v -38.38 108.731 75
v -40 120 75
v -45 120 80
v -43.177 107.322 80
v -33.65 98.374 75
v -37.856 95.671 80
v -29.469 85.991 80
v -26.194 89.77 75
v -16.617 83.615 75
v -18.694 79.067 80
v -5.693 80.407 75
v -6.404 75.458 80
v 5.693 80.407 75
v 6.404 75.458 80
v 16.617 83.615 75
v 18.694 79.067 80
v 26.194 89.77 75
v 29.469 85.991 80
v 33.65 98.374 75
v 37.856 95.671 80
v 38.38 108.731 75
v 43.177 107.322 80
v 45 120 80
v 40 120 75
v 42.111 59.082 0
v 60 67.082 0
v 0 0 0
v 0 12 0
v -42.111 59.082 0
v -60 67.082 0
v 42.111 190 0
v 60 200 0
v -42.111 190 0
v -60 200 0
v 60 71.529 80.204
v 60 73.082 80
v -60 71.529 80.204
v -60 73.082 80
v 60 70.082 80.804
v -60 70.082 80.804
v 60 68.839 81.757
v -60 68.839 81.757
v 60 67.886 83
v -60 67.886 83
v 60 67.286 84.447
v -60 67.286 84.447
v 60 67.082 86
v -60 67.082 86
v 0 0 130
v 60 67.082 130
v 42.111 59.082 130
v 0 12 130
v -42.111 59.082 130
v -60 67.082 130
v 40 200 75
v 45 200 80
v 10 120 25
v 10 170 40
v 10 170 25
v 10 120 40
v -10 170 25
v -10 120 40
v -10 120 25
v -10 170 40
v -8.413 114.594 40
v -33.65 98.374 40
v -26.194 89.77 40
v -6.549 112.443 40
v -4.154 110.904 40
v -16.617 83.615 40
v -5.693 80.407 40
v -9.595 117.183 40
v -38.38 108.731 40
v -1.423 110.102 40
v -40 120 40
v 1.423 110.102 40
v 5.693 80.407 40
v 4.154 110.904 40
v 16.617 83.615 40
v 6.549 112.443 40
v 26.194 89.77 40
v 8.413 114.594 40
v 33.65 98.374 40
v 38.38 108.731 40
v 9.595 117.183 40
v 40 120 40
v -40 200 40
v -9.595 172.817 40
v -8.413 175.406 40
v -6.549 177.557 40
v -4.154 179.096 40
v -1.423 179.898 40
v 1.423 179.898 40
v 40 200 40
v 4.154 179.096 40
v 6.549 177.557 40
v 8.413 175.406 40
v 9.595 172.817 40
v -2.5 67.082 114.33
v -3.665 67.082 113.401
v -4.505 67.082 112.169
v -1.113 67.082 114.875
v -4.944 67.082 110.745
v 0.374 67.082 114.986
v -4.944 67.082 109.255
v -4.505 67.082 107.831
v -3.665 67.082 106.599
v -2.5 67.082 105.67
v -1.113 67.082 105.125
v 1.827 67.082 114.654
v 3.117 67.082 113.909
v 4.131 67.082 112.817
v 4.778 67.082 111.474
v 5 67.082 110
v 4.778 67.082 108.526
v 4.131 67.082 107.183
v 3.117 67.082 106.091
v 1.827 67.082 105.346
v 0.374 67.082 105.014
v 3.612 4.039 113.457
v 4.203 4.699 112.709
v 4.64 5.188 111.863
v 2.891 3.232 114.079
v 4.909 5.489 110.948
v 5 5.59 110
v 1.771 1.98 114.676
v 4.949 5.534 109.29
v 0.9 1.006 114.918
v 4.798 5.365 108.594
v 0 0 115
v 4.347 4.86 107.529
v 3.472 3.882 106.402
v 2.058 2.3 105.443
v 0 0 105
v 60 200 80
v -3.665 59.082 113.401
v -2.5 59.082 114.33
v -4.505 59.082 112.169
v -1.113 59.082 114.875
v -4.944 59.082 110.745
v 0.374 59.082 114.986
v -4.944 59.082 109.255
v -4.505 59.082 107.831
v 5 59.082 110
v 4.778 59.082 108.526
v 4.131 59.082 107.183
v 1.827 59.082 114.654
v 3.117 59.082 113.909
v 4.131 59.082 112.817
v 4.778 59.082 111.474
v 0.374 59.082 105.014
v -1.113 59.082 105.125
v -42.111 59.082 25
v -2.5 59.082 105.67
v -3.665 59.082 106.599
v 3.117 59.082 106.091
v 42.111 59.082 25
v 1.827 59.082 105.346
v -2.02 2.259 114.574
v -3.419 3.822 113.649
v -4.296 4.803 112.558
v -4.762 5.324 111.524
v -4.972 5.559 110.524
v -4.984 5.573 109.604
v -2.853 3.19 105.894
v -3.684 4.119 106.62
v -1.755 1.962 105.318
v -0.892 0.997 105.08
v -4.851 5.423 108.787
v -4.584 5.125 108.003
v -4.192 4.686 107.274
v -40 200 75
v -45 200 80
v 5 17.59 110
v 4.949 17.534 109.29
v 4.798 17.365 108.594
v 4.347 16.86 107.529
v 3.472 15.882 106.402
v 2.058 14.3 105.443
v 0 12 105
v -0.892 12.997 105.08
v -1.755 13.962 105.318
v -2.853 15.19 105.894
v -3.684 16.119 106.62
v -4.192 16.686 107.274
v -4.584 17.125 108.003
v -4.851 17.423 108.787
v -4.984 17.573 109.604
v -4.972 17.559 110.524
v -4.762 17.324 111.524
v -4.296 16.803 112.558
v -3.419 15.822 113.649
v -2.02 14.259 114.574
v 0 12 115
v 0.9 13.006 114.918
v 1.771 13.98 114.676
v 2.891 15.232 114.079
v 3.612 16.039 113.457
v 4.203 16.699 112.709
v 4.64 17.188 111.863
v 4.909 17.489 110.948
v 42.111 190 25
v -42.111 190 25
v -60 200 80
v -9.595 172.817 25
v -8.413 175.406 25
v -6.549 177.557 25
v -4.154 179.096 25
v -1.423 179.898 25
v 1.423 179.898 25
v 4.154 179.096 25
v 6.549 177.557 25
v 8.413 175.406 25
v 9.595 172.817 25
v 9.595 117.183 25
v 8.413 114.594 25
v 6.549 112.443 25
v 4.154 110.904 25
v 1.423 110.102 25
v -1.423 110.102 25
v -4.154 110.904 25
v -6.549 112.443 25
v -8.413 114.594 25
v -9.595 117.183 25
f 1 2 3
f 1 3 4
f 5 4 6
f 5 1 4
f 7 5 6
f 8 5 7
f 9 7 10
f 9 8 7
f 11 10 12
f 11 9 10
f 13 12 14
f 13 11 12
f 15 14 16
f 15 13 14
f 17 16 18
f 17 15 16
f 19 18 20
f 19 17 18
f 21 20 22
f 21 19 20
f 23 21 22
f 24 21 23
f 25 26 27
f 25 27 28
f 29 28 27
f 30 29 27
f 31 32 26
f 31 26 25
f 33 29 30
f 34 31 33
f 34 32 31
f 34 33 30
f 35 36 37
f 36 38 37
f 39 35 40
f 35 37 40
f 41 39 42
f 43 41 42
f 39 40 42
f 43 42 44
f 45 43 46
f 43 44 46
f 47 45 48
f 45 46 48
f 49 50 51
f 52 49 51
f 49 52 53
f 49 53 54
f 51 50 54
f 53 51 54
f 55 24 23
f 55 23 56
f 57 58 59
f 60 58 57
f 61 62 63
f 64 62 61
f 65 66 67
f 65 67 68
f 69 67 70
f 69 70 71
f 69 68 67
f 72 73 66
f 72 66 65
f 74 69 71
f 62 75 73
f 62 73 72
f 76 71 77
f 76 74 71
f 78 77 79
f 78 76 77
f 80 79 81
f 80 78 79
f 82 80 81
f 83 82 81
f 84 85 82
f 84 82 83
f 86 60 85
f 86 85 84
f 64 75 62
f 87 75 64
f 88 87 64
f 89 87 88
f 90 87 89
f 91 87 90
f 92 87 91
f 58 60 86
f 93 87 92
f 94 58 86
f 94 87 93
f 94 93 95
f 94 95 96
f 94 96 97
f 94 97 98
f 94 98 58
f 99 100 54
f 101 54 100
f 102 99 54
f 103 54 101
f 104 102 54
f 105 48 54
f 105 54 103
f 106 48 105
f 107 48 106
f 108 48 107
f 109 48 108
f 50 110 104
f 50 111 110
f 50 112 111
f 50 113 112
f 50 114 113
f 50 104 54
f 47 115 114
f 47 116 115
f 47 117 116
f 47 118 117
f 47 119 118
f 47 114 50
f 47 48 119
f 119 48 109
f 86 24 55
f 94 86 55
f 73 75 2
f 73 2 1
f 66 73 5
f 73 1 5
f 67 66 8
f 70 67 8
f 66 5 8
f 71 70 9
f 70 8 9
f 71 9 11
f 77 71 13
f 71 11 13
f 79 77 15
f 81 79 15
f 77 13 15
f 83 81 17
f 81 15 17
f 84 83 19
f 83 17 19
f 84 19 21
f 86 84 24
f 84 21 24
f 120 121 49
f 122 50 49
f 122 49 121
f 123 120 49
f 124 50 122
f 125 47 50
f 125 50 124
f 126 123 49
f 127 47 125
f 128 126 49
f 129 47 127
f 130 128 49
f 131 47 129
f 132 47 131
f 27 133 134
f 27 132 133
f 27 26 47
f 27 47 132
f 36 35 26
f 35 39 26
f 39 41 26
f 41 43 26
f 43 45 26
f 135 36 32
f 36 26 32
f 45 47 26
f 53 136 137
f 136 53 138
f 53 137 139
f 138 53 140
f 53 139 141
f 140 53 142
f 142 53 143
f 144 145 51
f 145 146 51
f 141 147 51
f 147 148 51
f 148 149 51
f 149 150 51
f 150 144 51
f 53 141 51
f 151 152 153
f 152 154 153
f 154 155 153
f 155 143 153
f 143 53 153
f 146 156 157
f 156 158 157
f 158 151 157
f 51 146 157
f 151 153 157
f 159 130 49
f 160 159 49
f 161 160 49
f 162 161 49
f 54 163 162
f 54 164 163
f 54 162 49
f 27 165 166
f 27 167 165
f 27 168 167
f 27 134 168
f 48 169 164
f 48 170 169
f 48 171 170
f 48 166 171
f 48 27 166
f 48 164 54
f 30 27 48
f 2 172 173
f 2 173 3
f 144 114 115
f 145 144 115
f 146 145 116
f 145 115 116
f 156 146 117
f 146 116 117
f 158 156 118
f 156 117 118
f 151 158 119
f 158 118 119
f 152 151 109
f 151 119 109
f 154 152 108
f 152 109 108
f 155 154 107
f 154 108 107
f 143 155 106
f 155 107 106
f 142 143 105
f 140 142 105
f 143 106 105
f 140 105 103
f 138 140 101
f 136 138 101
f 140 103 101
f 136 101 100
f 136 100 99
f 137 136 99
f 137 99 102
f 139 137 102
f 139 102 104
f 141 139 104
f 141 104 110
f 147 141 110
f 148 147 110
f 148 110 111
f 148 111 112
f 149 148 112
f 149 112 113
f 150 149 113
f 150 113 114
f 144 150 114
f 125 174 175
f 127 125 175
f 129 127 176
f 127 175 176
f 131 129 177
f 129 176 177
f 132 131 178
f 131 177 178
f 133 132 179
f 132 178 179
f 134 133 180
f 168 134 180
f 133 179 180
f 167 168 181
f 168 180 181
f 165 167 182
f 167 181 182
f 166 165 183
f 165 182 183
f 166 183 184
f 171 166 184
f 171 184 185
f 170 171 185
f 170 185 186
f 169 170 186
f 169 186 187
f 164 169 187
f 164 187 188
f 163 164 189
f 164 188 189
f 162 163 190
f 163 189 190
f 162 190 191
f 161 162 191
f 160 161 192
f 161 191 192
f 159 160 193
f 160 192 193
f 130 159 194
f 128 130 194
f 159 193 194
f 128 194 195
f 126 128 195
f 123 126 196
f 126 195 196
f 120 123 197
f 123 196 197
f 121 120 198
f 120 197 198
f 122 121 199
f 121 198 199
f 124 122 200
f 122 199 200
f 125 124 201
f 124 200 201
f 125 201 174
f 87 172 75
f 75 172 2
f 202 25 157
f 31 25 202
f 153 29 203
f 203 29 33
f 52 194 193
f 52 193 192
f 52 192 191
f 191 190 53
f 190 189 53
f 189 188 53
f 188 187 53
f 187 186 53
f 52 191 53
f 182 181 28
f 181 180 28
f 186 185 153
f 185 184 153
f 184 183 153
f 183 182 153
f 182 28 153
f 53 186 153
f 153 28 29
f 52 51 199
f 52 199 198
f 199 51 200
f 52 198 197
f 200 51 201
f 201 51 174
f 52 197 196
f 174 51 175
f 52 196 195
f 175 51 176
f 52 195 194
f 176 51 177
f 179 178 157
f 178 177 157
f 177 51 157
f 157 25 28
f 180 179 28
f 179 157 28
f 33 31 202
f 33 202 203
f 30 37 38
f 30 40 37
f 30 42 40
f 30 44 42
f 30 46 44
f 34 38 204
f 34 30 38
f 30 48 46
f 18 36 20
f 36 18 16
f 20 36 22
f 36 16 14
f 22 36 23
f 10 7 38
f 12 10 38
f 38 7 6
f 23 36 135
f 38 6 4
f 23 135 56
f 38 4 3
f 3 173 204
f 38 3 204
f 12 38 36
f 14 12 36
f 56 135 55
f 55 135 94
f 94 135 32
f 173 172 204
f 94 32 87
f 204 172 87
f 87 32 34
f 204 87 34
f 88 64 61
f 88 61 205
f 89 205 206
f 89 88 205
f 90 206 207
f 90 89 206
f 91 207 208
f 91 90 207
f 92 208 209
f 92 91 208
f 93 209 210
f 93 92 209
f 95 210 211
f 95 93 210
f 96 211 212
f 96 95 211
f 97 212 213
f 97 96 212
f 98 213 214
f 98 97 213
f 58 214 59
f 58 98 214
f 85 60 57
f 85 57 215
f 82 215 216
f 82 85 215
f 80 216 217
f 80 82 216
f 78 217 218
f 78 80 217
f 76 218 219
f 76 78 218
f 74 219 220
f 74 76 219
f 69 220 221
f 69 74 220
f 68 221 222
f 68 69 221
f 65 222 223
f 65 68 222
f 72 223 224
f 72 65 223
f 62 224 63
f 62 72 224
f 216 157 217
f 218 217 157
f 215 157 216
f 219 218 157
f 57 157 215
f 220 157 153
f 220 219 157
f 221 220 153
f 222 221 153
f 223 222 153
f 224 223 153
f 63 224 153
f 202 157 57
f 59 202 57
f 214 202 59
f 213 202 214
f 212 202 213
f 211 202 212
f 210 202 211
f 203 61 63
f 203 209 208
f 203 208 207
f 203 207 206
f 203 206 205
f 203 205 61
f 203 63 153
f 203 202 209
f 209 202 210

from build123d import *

# Parameters (mm, degrees)
BOSS_EXTRUDE1_DEPTH = 130
SKETCH2_W           = 120
SKETCH2_H           = 132.917960675
BOSS_EXTRUDE2_DEPTH = 80
SKETCH3_R           = 5
CUT_EXTRUDE1_DEPTH  = 68.082039325
CUT_EXTRUDE3_DEPTH  = 40
CHAMFER1_SIZE       = 5
FILLET1_R           = 6
CUT_EXTRUDE4_DEPTH  = 41
SKETCH6_W           = 84.22291236
SKETCH6_H           = 130.917960675
CUT_EXTRUDE5_DEPTH  = 25


with BuildPart() as part:
    # Sketch1 → Boss-Extrude1 (new body)
    with BuildSketch(Plane.XY):
        Polygon((0, 0), (-60, 67.082039325), (60, 67.082039325), align=None)
        Polygon((0, 12), (-42.11145618, 59.082039325), (42.11145618, 59.082039325), align=None, mode=Mode.SUBTRACT)
    extrude(amount=BOSS_EXTRUDE1_DEPTH)

    # Sketch2 → Boss-Extrude2 (add)
    with BuildSketch(Plane(origin=(0, 0, 0), x_dir=(-1, 0, 0), z_dir=(0, 0, -1))):
        with Locations((0, 133.541019662)):
            Rectangle(SKETCH2_W, SKETCH2_H)
    extrude(amount=-BOSS_EXTRUDE2_DEPTH)

    # Sketch3 → Cut-Extrude1 (cut, through all)
    with BuildSketch(Plane(origin=(0, 67.082039325, 0), x_dir=(1, 0, 0), z_dir=(0, 1, 0))):
        with Locations((0, -110)):
            Circle(SKETCH3_R)
    extrude(amount=-CUT_EXTRUDE1_DEPTH, mode=Mode.SUBTRACT)

    # Sketch4 → Cut-Extrude3 (cut)
    with BuildSketch(Plane.XY.offset(80)):
        with BuildLine():
            Line((-40, 200), (-40, 120))
            ThreePointArc((-40, 120), (0, 80), (40, 120))
            Line((40, 120), (40, 200))
            Line((40, 200), (-40, 200))
        make_face()
    extrude(amount=-CUT_EXTRUDE3_DEPTH, mode=Mode.SUBTRACT)

    # Chamfer1
    chamfer1_edges = [part.edges().sort_by_distance(p)[0] for p in [
        (-40, 160, 80),
        (0, 80, 80),
        (40, 160, 80),
    ]]
    chamfer(chamfer1_edges, length=CHAMFER1_SIZE)

    # Fillet1
    fillet1_edges = [part.edges().sort_by_distance(p)[0] for p in [
        (0, 67.082039325, 80),
    ]]
    fillet(fillet1_edges, radius=FILLET1_R)

    # Sketch5 → Cut-Extrude4 (cut, through all)
    with BuildSketch(Plane.XY.offset(40)):
        with BuildLine():
            Line((10, 170), (10, 120))
            ThreePointArc((10, 120), (0, 110), (-10, 120))
            Line((-10, 120), (-10, 170))
            ThreePointArc((-10, 170), (0, 180), (10, 170))
        make_face()
    extrude(amount=-CUT_EXTRUDE4_DEPTH, mode=Mode.SUBTRACT)

    # Sketch6 → Cut-Extrude5 (cut)
    with BuildSketch(Plane(origin=(0, 0, 0), x_dir=(-1, 0, 0), z_dir=(0, 0, -1))):
        with Locations((0, 124.541019663)):
            Rectangle(SKETCH6_W, SKETCH6_H)
    extrude(amount=-CUT_EXTRUDE5_DEPTH, mode=Mode.SUBTRACT)


solid = part.part
